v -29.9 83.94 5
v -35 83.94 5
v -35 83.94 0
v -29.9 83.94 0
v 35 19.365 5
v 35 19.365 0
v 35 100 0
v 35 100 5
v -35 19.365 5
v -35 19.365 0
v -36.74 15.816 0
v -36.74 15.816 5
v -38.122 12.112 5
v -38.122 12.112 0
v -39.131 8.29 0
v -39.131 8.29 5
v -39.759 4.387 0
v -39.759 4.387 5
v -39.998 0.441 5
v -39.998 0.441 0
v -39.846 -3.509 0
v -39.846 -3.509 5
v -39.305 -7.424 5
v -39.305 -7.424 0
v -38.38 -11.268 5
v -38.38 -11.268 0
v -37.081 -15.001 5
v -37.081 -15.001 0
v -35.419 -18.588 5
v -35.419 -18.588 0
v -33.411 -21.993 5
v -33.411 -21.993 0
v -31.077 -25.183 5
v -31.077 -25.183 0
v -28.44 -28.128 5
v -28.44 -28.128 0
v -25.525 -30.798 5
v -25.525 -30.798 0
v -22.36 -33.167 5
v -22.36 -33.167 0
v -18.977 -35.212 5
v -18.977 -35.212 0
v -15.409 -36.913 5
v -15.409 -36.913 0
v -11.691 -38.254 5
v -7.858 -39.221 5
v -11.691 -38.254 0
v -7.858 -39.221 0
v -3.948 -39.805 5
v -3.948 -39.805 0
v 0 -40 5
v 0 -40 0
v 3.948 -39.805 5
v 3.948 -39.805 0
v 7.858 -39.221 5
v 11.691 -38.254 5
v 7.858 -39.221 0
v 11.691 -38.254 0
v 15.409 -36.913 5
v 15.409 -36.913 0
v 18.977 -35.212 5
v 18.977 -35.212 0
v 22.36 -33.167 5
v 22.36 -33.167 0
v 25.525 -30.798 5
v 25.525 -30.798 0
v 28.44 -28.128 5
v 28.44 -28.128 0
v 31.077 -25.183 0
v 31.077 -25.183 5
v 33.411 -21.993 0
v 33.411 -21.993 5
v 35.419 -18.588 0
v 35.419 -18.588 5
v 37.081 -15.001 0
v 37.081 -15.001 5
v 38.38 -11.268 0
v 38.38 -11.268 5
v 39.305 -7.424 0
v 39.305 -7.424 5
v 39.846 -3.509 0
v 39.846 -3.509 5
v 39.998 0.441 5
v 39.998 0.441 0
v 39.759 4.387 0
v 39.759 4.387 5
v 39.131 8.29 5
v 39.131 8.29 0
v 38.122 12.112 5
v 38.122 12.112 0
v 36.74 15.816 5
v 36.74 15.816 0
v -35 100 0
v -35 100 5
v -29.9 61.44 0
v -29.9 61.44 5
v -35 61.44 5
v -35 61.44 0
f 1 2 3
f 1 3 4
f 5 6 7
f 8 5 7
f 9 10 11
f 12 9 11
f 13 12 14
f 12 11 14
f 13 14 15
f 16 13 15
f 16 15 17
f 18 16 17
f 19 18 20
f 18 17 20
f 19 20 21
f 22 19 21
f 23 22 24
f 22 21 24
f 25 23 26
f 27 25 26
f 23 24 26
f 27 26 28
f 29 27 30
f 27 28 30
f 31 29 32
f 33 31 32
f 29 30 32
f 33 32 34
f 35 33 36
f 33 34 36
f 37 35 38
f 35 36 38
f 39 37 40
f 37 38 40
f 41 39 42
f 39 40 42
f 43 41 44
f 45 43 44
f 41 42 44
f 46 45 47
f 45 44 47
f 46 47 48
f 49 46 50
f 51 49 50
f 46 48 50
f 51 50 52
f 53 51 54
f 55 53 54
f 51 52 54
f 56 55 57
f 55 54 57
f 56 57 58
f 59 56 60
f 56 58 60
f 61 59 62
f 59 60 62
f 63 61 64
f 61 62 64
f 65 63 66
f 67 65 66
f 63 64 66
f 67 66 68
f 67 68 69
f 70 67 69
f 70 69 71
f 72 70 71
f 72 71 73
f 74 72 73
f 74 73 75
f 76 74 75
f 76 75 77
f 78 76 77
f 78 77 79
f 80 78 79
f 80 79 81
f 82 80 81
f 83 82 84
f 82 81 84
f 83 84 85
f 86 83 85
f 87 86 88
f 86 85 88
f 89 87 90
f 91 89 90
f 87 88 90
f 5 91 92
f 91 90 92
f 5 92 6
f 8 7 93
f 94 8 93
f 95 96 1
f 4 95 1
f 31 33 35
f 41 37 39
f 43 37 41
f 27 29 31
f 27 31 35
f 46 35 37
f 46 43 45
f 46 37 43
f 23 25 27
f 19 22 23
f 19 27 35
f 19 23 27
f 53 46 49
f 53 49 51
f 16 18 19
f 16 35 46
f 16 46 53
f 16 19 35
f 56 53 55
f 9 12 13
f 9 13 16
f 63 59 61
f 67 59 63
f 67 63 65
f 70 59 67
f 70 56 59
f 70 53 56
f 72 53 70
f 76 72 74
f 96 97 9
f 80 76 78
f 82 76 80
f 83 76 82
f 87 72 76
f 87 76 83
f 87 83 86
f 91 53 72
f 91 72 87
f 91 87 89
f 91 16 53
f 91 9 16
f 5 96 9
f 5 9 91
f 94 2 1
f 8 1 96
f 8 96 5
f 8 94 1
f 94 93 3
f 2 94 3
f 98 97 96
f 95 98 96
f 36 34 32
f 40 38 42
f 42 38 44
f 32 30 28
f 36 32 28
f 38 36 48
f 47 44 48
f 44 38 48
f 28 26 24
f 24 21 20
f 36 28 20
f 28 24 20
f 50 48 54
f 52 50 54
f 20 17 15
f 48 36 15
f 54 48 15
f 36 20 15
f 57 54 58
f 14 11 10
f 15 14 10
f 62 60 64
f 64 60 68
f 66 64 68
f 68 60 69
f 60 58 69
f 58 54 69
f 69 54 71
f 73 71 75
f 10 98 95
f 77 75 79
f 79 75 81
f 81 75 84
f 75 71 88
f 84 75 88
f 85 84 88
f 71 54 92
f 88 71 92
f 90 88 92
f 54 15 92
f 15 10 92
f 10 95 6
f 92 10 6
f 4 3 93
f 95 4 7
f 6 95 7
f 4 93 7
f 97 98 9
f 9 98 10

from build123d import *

# Parameters (mm, degrees)
EXTRUDE_1_DEPTH     = 5
SKETCH_2_W          = 12.2
SKETCH_2_H          = 22.5
CUT_EXTRUDE_1_DEPTH = 108.819293264


with BuildPart() as part:
    # ｽｹｯﾁ1 → ﾎﾞｽ - 押し出し1 (new body)
    with BuildSketch(Plane.XY):
        with BuildLine():
            Line((35, 100), (-35, 100))
            Line((-35, 100), (-35, 19.364916731))
            ThreePointArc((-35, 19.364916731), (0, -40), (35, 19.364916731))
            Line((35, 19.364916731), (35, 100))
        make_face()
    extrude(amount=EXTRUDE_1_DEPTH)

    # ｽｹｯﾁ2 → ｶｯﾄ - 押し出し1 (cut, through all)
    with BuildSketch(Plane.XY.offset(5)):
        with Locations((-36, 72.689802684)):
            Rectangle(SKETCH_2_W, SKETCH_2_H)
    extrude(amount=-CUT_EXTRUDE_1_DEPTH, mode=Mode.SUBTRACT)


solid = part.part
